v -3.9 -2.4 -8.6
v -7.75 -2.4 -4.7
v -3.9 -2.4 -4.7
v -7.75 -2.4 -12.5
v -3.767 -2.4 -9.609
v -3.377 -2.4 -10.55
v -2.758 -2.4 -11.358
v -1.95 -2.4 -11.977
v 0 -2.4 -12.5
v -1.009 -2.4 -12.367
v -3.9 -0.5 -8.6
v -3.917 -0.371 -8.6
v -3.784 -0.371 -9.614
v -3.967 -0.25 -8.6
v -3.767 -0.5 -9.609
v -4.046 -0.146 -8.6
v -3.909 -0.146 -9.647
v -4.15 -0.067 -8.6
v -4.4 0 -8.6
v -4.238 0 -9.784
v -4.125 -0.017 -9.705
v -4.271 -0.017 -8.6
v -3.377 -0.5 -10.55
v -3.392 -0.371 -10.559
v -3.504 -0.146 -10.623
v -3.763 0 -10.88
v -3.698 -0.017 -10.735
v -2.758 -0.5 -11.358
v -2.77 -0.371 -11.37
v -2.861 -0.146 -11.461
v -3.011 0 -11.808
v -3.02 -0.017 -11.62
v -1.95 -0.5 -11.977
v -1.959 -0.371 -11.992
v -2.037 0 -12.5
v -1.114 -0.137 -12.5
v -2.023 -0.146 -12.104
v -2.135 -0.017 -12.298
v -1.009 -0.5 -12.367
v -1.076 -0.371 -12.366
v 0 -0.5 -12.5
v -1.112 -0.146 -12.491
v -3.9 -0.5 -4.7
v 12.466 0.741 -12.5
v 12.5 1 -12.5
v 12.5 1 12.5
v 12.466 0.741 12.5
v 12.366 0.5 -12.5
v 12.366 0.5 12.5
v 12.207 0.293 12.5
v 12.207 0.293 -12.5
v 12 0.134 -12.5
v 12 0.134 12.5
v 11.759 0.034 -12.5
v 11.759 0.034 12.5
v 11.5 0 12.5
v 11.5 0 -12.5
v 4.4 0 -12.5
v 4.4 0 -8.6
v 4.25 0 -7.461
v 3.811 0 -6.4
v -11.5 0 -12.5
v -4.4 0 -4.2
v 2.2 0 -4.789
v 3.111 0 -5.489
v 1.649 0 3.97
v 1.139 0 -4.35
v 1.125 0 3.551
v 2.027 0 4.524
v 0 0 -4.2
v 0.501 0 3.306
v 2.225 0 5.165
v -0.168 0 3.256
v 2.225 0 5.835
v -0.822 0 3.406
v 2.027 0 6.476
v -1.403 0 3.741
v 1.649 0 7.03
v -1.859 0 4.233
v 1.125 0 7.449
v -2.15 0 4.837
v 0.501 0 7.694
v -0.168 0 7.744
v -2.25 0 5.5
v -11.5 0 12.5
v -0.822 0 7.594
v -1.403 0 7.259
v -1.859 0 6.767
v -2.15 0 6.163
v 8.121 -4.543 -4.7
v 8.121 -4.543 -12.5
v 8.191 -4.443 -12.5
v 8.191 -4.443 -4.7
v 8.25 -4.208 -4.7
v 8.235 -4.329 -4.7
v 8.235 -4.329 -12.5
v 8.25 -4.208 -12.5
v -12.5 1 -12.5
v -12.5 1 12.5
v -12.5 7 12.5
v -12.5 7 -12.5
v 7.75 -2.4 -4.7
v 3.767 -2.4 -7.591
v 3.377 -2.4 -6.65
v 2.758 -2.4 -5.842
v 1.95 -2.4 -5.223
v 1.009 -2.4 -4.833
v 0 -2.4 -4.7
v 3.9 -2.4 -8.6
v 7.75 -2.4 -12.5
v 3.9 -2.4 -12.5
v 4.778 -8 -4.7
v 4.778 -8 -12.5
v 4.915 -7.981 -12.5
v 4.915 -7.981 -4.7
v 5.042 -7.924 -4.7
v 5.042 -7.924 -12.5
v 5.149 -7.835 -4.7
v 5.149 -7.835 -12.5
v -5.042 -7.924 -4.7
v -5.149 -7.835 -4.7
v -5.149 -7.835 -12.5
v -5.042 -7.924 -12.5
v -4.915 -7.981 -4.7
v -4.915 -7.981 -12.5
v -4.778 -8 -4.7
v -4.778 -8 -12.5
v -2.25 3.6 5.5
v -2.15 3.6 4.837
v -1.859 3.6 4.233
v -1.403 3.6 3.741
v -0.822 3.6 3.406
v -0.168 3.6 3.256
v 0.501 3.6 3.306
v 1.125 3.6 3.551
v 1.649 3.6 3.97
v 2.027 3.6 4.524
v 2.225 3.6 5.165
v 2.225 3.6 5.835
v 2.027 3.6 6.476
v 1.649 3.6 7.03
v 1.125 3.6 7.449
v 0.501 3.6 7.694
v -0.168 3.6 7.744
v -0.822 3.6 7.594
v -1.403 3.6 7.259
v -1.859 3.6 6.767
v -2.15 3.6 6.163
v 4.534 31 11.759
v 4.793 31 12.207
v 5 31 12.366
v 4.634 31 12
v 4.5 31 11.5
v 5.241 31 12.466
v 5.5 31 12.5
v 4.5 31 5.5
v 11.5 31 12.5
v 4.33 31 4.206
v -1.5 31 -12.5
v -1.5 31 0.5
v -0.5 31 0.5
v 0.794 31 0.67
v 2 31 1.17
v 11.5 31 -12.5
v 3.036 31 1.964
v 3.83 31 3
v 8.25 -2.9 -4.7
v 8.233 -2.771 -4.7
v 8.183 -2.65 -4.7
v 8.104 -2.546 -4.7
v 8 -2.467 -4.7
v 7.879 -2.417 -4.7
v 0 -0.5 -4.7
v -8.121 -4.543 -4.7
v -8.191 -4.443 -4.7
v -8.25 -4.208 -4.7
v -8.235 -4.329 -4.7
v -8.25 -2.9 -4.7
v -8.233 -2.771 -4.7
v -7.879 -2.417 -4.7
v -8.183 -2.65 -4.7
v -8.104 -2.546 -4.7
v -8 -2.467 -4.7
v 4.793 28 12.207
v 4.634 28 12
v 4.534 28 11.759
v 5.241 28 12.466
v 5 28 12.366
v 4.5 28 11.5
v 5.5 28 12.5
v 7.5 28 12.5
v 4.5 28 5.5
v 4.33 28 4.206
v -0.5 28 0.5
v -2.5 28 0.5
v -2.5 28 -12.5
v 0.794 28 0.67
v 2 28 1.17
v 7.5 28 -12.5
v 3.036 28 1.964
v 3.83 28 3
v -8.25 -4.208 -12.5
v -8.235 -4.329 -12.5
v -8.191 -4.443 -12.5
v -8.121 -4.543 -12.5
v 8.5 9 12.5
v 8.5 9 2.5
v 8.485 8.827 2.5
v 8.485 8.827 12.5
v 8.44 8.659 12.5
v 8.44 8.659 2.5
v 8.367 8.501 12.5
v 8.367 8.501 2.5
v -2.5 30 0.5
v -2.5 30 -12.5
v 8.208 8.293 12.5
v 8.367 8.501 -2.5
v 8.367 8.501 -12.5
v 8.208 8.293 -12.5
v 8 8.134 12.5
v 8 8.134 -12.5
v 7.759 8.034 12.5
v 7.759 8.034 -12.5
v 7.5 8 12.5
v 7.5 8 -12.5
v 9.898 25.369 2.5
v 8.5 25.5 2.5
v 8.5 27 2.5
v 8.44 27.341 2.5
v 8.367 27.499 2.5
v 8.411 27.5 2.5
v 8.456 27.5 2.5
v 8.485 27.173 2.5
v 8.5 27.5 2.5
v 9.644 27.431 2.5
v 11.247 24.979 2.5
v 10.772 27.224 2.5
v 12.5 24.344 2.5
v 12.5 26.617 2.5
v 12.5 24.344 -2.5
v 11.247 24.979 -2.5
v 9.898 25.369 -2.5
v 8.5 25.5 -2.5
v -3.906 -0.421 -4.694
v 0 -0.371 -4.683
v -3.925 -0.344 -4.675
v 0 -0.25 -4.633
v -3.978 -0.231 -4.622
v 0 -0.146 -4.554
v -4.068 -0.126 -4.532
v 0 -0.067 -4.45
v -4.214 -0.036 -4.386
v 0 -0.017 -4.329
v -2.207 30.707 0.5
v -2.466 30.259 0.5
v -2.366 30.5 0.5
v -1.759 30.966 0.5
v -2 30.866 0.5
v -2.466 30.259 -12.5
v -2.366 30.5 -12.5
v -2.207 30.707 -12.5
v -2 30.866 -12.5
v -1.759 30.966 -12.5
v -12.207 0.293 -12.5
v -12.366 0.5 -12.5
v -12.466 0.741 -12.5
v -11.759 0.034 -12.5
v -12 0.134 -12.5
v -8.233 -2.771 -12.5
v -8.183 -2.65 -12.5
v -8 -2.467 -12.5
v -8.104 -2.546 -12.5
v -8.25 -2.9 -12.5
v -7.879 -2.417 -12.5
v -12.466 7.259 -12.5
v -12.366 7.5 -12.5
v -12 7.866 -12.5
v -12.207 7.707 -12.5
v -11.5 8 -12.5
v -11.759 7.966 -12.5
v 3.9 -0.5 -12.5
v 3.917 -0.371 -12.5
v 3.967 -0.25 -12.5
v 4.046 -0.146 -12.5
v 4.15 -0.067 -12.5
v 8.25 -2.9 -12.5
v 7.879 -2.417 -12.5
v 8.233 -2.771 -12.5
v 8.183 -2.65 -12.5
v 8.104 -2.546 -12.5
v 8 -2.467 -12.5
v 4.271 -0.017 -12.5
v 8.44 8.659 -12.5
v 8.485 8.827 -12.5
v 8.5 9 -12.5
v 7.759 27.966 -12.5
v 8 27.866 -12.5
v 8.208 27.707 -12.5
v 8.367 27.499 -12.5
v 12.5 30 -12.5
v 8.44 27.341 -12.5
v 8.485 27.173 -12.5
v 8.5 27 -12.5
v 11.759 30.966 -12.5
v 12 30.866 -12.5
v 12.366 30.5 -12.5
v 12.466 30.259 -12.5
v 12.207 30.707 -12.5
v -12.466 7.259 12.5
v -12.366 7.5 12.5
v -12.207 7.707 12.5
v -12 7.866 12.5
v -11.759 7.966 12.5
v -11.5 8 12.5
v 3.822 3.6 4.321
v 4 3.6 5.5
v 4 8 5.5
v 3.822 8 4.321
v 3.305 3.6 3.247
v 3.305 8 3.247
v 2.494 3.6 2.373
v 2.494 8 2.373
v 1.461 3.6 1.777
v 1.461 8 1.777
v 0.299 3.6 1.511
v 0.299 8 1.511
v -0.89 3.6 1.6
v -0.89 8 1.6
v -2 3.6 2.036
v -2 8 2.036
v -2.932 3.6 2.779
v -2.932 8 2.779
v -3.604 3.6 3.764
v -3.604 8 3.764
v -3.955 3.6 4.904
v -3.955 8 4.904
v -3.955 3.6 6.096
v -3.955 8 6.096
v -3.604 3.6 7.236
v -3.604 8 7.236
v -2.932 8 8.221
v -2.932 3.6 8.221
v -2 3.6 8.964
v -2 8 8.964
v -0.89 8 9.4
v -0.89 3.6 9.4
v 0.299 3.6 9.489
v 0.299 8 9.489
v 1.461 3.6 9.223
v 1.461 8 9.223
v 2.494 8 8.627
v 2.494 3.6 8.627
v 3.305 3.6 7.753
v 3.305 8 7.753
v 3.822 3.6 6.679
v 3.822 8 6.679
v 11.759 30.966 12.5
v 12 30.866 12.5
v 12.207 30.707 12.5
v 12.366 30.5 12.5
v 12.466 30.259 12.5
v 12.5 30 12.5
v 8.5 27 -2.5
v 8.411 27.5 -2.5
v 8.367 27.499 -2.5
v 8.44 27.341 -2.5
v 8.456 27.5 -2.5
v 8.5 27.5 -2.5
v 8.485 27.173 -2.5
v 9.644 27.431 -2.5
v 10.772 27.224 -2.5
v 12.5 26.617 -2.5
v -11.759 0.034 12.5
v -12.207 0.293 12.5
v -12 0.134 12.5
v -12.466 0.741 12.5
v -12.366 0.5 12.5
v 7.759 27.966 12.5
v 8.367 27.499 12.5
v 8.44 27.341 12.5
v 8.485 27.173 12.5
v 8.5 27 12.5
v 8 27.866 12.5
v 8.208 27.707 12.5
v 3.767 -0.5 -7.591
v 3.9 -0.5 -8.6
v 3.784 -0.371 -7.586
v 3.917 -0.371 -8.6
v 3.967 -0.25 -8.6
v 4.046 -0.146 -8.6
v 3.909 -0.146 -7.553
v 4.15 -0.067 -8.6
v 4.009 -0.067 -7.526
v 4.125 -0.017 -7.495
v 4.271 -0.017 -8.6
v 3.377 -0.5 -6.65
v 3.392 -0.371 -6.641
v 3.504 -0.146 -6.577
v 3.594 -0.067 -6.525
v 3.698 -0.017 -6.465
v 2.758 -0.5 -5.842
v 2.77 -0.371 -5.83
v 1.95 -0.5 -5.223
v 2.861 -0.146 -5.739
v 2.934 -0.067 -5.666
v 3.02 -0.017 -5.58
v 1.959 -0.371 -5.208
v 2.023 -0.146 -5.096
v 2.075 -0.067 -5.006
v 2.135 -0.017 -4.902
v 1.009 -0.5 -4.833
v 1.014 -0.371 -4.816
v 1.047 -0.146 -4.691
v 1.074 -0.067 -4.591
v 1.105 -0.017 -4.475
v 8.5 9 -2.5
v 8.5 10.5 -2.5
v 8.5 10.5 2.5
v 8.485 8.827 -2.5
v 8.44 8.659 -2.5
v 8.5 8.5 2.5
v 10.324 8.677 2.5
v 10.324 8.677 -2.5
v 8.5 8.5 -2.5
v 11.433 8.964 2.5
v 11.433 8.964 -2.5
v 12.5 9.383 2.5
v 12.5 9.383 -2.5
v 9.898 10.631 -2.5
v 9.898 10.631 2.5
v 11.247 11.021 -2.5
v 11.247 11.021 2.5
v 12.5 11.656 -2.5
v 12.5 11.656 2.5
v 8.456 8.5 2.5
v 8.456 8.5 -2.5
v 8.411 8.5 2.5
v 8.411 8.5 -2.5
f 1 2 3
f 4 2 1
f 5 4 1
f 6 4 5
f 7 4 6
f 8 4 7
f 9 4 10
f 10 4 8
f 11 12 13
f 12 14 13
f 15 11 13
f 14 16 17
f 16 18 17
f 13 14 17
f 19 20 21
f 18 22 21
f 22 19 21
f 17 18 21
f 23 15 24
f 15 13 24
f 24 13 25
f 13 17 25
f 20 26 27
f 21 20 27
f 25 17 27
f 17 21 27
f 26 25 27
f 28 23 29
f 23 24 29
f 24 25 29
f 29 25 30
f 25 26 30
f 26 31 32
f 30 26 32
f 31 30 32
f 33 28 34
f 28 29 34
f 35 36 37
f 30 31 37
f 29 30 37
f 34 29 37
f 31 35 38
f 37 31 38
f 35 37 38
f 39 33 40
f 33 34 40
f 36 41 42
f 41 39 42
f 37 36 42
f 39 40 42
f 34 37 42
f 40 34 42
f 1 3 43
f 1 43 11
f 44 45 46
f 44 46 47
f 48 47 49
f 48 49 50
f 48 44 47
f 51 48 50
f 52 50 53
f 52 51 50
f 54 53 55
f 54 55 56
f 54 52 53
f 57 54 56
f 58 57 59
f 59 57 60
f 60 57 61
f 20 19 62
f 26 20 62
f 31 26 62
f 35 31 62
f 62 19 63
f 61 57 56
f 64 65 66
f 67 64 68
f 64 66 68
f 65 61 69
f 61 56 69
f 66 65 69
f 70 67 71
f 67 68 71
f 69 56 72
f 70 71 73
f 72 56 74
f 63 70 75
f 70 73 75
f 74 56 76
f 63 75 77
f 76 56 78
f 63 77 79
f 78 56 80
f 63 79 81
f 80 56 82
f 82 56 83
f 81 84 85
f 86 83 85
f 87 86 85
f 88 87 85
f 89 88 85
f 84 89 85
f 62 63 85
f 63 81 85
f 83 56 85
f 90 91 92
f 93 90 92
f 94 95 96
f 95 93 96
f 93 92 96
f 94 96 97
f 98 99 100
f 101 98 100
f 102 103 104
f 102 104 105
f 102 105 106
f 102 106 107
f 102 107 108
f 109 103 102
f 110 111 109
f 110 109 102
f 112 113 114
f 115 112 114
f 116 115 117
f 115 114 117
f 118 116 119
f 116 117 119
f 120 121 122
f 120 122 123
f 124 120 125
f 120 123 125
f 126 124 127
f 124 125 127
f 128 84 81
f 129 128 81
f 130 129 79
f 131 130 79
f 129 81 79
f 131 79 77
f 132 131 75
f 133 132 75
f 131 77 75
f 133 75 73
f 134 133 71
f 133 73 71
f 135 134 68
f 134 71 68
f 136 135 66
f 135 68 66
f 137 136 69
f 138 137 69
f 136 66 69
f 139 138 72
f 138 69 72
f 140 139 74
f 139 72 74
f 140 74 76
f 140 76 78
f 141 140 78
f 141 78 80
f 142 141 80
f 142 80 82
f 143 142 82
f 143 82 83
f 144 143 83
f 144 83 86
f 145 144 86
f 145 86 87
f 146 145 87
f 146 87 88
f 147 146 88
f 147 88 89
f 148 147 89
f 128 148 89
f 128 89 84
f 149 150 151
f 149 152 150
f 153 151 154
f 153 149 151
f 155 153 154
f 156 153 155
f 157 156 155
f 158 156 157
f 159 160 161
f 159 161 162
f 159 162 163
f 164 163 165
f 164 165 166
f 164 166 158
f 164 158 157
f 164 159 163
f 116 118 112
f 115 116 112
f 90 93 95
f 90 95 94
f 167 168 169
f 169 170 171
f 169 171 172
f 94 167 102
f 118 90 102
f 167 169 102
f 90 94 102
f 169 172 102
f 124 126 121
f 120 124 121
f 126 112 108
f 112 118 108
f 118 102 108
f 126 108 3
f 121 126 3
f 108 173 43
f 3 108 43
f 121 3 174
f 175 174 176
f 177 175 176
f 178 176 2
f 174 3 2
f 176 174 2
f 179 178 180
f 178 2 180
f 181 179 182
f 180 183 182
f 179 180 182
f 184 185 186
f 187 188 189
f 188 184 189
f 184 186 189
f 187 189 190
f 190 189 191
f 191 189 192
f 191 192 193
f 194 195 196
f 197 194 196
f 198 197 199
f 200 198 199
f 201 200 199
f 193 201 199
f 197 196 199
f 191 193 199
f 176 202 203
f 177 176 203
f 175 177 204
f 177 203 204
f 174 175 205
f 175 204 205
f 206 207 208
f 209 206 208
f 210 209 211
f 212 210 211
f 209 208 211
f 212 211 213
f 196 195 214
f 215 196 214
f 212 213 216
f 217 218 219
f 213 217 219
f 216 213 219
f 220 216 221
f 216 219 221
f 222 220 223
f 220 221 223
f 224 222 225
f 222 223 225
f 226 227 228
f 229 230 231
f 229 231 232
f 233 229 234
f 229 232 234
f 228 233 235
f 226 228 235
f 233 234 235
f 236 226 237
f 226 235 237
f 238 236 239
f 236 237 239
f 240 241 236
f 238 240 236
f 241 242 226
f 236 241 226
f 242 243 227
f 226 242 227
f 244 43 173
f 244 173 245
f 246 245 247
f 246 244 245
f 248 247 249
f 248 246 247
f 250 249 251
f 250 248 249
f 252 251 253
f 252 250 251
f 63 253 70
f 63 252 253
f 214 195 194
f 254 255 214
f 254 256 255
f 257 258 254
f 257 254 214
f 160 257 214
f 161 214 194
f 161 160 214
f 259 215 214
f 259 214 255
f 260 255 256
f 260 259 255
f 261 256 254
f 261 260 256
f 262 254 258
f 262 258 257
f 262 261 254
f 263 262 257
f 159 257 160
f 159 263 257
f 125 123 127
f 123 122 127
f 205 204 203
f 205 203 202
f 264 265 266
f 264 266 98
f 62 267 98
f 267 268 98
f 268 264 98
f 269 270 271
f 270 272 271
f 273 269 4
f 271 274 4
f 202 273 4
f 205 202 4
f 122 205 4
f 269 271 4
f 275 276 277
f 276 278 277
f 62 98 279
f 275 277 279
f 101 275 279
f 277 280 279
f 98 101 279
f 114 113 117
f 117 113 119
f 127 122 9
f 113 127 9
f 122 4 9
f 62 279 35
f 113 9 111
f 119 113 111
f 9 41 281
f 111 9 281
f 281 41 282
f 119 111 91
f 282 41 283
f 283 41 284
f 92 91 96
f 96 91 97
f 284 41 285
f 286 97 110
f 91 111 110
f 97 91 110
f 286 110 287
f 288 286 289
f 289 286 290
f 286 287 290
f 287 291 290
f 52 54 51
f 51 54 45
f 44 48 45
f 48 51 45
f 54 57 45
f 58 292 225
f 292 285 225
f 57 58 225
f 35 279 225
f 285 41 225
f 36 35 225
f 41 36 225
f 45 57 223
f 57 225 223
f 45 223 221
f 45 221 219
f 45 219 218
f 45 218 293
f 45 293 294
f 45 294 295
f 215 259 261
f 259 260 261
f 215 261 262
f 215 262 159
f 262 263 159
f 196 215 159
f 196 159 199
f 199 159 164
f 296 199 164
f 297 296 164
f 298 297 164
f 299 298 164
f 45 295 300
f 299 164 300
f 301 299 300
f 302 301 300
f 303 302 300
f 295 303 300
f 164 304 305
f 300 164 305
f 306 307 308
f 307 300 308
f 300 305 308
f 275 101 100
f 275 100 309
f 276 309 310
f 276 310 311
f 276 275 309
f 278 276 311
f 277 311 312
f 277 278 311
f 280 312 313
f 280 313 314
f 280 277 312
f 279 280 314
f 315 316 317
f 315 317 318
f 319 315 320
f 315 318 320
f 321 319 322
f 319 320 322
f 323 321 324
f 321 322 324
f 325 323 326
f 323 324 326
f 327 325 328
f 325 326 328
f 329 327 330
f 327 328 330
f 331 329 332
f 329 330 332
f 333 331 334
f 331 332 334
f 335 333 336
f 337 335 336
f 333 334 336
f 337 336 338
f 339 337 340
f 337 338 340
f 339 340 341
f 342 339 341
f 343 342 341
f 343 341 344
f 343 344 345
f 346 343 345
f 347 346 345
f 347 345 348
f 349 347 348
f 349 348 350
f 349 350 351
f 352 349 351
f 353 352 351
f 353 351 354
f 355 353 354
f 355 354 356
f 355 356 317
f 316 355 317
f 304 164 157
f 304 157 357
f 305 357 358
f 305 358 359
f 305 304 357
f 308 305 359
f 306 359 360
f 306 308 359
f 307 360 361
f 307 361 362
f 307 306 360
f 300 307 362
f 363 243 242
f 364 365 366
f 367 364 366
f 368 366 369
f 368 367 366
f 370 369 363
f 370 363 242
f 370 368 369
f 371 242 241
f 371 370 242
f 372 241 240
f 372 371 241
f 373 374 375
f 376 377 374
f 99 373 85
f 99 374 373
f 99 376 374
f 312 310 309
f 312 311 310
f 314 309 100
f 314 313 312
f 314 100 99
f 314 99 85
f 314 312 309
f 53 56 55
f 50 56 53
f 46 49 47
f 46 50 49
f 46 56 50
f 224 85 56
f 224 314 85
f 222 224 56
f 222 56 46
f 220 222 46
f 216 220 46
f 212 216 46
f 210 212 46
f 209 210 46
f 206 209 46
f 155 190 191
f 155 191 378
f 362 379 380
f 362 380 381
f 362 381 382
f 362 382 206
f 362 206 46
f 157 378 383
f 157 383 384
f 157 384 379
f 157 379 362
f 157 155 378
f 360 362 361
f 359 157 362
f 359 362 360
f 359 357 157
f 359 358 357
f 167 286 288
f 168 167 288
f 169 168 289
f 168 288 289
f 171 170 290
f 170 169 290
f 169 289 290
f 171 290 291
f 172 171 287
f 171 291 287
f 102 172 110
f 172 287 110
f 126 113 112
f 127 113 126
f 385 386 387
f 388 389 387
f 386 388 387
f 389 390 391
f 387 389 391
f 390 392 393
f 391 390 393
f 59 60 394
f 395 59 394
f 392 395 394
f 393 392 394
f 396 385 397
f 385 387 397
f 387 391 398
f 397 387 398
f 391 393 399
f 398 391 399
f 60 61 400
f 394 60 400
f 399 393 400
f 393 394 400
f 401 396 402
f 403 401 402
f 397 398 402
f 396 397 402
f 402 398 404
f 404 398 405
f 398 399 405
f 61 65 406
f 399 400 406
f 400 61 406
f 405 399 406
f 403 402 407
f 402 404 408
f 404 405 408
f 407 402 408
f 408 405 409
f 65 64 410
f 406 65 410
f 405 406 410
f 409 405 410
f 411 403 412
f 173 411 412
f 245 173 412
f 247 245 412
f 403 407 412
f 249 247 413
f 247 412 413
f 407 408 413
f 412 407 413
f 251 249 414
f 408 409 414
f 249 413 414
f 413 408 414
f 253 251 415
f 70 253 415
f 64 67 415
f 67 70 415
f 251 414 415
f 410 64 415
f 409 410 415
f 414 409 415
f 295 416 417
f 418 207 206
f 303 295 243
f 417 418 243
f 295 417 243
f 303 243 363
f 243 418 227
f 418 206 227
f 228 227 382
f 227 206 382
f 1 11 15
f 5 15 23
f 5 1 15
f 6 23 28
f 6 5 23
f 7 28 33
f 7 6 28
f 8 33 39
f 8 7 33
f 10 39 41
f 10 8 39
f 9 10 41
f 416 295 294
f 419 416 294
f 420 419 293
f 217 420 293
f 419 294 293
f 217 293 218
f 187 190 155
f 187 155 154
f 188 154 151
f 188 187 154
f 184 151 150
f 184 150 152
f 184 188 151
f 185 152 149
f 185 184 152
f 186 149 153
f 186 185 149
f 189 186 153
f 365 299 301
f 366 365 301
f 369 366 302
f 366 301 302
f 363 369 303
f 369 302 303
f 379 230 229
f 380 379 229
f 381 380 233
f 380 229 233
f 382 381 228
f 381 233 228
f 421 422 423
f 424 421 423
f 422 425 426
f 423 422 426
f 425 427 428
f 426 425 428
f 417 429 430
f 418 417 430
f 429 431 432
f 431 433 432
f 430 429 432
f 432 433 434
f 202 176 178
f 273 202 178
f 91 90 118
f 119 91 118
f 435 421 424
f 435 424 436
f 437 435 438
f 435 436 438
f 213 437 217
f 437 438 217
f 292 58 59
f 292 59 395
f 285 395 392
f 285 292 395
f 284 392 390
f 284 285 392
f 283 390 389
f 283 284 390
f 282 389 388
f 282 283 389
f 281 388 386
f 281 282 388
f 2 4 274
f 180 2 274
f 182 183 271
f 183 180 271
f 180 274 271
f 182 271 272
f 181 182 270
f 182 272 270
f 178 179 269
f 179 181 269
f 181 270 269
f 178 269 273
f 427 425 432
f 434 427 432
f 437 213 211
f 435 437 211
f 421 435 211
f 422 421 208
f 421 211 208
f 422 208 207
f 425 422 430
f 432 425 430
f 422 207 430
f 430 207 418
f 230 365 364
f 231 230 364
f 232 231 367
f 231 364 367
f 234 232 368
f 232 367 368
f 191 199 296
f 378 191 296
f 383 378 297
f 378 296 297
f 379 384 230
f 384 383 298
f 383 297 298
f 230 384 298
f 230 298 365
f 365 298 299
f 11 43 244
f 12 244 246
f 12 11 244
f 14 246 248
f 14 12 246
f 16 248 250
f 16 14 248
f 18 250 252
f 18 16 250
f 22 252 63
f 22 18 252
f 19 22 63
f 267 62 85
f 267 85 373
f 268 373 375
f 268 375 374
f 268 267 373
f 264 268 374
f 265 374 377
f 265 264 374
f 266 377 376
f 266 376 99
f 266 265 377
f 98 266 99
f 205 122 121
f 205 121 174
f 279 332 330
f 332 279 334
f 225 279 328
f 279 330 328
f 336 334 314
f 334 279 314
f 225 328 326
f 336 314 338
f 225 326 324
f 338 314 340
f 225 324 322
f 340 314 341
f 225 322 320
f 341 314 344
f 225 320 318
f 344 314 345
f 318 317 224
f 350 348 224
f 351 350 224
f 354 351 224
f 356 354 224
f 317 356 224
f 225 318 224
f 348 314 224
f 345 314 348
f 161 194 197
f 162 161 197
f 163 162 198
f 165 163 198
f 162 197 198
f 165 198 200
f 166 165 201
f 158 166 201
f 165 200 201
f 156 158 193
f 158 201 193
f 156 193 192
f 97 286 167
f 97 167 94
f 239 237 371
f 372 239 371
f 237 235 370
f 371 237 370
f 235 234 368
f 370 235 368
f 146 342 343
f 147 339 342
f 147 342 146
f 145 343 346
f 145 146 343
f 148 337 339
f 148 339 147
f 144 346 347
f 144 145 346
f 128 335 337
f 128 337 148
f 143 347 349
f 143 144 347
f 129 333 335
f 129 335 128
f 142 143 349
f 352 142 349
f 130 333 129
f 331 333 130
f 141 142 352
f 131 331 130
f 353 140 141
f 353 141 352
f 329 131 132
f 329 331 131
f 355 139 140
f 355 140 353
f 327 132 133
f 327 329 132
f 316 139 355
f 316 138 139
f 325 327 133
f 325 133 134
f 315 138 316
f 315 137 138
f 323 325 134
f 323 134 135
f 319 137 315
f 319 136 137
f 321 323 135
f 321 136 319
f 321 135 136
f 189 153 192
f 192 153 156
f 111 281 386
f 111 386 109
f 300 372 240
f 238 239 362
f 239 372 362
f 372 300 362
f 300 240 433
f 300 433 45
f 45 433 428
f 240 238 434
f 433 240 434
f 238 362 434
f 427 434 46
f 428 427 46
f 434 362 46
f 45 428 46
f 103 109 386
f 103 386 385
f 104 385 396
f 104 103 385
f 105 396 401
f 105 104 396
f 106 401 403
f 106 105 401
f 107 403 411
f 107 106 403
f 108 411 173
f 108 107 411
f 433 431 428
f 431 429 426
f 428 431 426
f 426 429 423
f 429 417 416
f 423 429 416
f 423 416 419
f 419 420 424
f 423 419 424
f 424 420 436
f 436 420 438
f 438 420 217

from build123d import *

# Parameters (mm, degrees)
BOSS_EXTRUDE1_DEPTH                                 = 12.5
CBORE_FOR_M4_HEX_SOCKET_HEAD_CAP_SCREW1_D           = 4.5
CBORE_FOR_M4_HEX_SOCKET_HEAD_CAP_SCREW1_DEPTH       = 8
CBORE_FOR_M4_HEX_SOCKET_HEAD_CAP_SCREW1_CBORE_D     = 8
CBORE_FOR_M4_HEX_SOCKET_HEAD_CAP_SCREW1_CBORE_DEPTH = 4.4
BOSS_EXTRUDE3_DEPTH                                 = 7.8
CUT_EXTRUDE3_REACH                                  = 44.819
SKETCH15_W                                          = 6.999999999999991
SKETCH15_H                                          = 12.000000000000002
CUT_EXTRUDE1_DEPTH                                  = 2.4
FILLET3_R                                           = 0.5
SKETCH13_W                                          = 1.9999999999999998
SKETCH13_H                                          = 5
FILLET4_START                                       = 28
FILLET4_DEPTH                                       = 3
FILLET4_START_2                                     = -12.5
FILLET4_2_DEPTH                                     = 25
FILLET4_3_DEPTH                                     = 10
FILLET4_START_3                                     = 2.5
FILLET4_4_DEPTH                                     = 10
FILLET4_START_4                                     = 27
FILLET4_5_DEPTH                                     = 5
FILLET4_START_5                                     = -13
FILLET4_6_DEPTH                                     = 26


with BuildPart() as part:
    # Sketch1 → Boss-Extrude1 (new, symmetric)
    with BuildSketch(Plane.XY):
        Polygon((-12.5, 7.999999999999993), (8.500000000000004, 7.9999999999999885), (8.500000000000004, 27.999999999999982), (-2.4999999999999987, 27.999999999999975), (-2.4999999999999987, 30.99999999999999), (12.5, 31), (12.5, -2.94e-15), (-12.5, -1.41e-15), align=None)
    extrude(amount=BOSS_EXTRUDE1_DEPTH, both=True)

    # CBORE for M4 Hex Socket Head Cap Screw1
    with Locations(Plane(origin=(1.98e-15, 7.999999999999989, 0), x_dir=(1, -1.1e-16, 0), z_dir=(1.1e-16, 1, 0))):
        with Locations((0, -5.5)):
            CounterBoreHole(CBORE_FOR_M4_HEX_SOCKET_HEAD_CAP_SCREW1_D / 2, CBORE_FOR_M4_HEX_SOCKET_HEAD_CAP_SCREW1_CBORE_D / 2, CBORE_FOR_M4_HEX_SOCKET_HEAD_CAP_SCREW1_CBORE_DEPTH, depth=CBORE_FOR_M4_HEX_SOCKET_HEAD_CAP_SCREW1_DEPTH)

    # Sketch5 → Boss-Extrude3 (add)
    with BuildSketch(Plane(origin=(0, 0, -12.5), x_dir=(-1, 0, 0), z_dir=(0, 0, -1))):
        Polygon((-4.999999999999999, -8), (5.000000000000001, -7.999999999999998), (8.249999999999996, -4.400000000000003), (8.25, -2.400000000000003), (3.9000000000000012, -2.400000000000003), (3.9, -3.06e-15), (-3.9, -4.02e-15), (-3.9000000000000004, -2.400000000000004), (-8.25, -2.400000000000005), (-8.249999999999996, -4.400000000000005), align=None)
    extrude(amount=-BOSS_EXTRUDE3_DEPTH)

    # Sketch15 → Cut-Extrude3 (cut, up to next)
    with BuildSketch(Plane(origin=(-2.151e-14, 30.999999999999993, 0), x_dir=(1, 6.9e-16, 0), z_dir=(-6.9e-16, 1, 0)), mode=Mode.PRIVATE) as cut_extrude3_sk1:
        with Locations((1.0000000000000187, -6.500000000000001)):
            Rectangle(SKETCH15_W, SKETCH15_H)
    cut_extrude3_tool1 = extrude(cut_extrude3_sk1.sketch, amount=-CUT_EXTRUDE3_REACH, mode=Mode.PRIVATE) & part.part
    add(cut_extrude3_tool1.solids().sort_by_distance((1, 31, 6.5))[0], mode=Mode.SUBTRACT)

    # Sketch6 → Cut-Extrude1 (cut)
    with BuildSketch(Plane(origin=(0, -2.400000000000003, 0), x_dir=(1, 0, 0), z_dir=(0, 1, 0))):
        with BuildLine():
            ThreePointArc((-3.900000000000001, 8.600000000000001), (-2.7577164466274824, 11.357716446627592), (1.491e-13, 12.500000000000004))
            Line((1.4921e-13, 12.5), (-3.9, 12.5))
            Line((-3.9, 12.5), (-3.9, 8.600000000000005))
        make_face()
        with BuildLine():
            Line((3.9, 4.700000000000001), (3.9000000000000004, 8.600000000000001))
            ThreePointArc((3.9000000000000026, 8.6), (2.7577164513941343, 5.842283558139062), (1.348197454e-08, 4.699999999999999))
            Line((1.348197465e-08, 4.700000000000001), (3.9, 4.700000000000001))
        make_face()
    extrude(amount=CUT_EXTRUDE1_DEPTH, mode=Mode.SUBTRACT)

    # Fillet3
    # the kernel refuses this fillet: 0.5 mm, written as the material it adds along each edge
    with BuildSketch(Plane(origin=(-3.9, -3.06e-15, -4.7), x_dir=(0, 2.38e-15, 1), z_dir=(1, -1.2e-16, 0))) as fillet3_piece_1:
        with BuildLine():
            CenterArc((FILLET3_R, FILLET3_R), FILLET3_R, 180, 90.00000000000011)
            Line((-1.19e-15, FILLET3_R), (0, 0))
            Line((0, 0), (FILLET3_R, 0))
        make_face()
    extrude(amount=3.9000000134819746)
    with BuildSketch(Plane(origin=(-3.9, -3.06e-15, -8.600000000000003), x_dir=(-1, 2.35e-15, 0), z_dir=(0, 0, 1))) as fillet3_piece_2:
        with BuildLine():
            CenterArc((FILLET3_R, FILLET3_R), FILLET3_R, 179.99999999999997, 90.00000000000017)
            Line((-2.51e-15, FILLET3_R), (0, 0))
            Line((0, 0), (FILLET3_R, 0))
        make_face()
    extrude(amount=3.900000000000003)
    with BuildSketch(Plane(origin=(3.9, -4.02e-15, -12.5), x_dir=(1, 3.15e-15, 0), z_dir=(0, 0, 1))) as fillet3_piece_3:
        with BuildLine():
            CenterArc((FILLET3_R, -FILLET3_R), FILLET3_R, 89.99999999999982, 90.00000000000017)
            Line((-1.13e-15, -FILLET3_R), (0, 0))
            Line((0, 0), (FILLET3_R, 0))
        make_face()
    extrude(amount=3.8999999999999986)
    with BuildSketch(Plane(origin=(-1.78e-15, -3.11e-15, -8.600000000000005), x_dir=(1, 0, 1.37e-15), z_dir=(1.37e-15, 0, -1))) as fillet3_piece_4:
        with BuildLine():
            CenterArc((3.9000000000000057 + FILLET3_R, FILLET3_R), FILLET3_R, 179.99999999999991, 90.00000000000011)
            Line((3.9000000000000057, FILLET3_R), (3.9000000000000057, 0))
            Line((3.9000000000000057, 0), (3.9000000000000057 + FILLET3_R, -7.8e-16))
        make_face()
    revolve(axis=Axis((-1.78e-15, -3.11e-15, -8.600000000000005), (0, -1, 0)), revolution_arc=89.99999980193317)
    with BuildSketch(Plane(origin=(-4.4e-16, -3.11e-15, -8.600000000000005), x_dir=(-1, 0, 9.1e-16), z_dir=(9.1e-16, 0, 1))) as fillet3_piece_5_section:
        with BuildLine():
            CenterArc((3.9 + FILLET3_R, FILLET3_R), FILLET3_R, 179.99999999999986, 90.00000000000011)
            Line((3.9, FILLET3_R), (3.9, 0))
            Line((3.9, 0), (3.9 + FILLET3_R, -1.11e-15))
        make_face()
    fillet3_piece_5 = revolve(axis=Axis((-4.4e-16, -3.11e-15, -8.600000000000005), (0, -1, 0)), revolution_arc=121.23139509020365, mode=Mode.PRIVATE)
    fillet3_piece_5 = split(fillet3_piece_5, bisect_by=Plane(origin=(-4.4e-16, -3.11e-15, -12.5), z_dir=(0, 0, 1)), keep=Keep.TOP, mode=Mode.PRIVATE)
    add(fillet3_piece_5)
    with BuildSketch(Plane(origin=(-5.15, -2.91e-15, -4.7), x_dir=(0, 2.38e-15, 1), z_dir=(1, -1.2e-16, 0))) as fillet3_piece_6a_section:
        with BuildLine():
            CenterArc((FILLET3_R, FILLET3_R), FILLET3_R, 180, 90.00000000000011)
            Line((-1.19e-15, FILLET3_R), (0, 0))
            Line((0, 0), (FILLET3_R, 0))
        make_face()
    fillet3_piece_6a = extrude(amount=5.150000013481975, mode=Mode.PRIVATE)
    fillet3_piece_6a = split(fillet3_piece_6a, bisect_by=Plane(origin=(-3.9, -3.6e-15, -4.7), z_dir=(-1, 5.6e-16, 0)), keep=Keep.TOP, mode=Mode.PRIVATE)
    with BuildSketch(Plane(origin=(-3.9, -3.06e-15, -8.600000000000003), x_dir=(-1, 2.35e-15, 0), z_dir=(0, 0, 1))) as fillet3_piece_6b_section:
        with BuildLine():
            CenterArc((FILLET3_R, FILLET3_R), FILLET3_R, 179.99999999999997, 90.00000000000017)
            Line((-2.51e-15, FILLET3_R), (0, 0))
            Line((0, 0), (FILLET3_R, 0))
        make_face()
    fillet3_piece_6b = extrude(amount=5.150000000000004, mode=Mode.PRIVATE)
    fillet3_piece_6b = split(fillet3_piece_6b, bisect_by=Plane(origin=(-3.9, -3.06e-15, -4.7), z_dir=(0, 0, 1)), keep=Keep.TOP, mode=Mode.PRIVATE)
    fillet3_piece_6 = fillet3_piece_6a & fillet3_piece_6b
    add(fillet3_piece_6)
    # the kernel refuses this fillet: 0.5 mm, written as the material it takes off along each edge
    with BuildSketch(Plane(origin=(-8.249999999999996, -4.400000000000003, -12.98076923076923), x_dir=(0.6701030927835051, -0.7422680412371134, 0), z_dir=(0, 0, 1))) as fillet3_2_piece_1:
        with BuildLine():
            CenterArc((FILLET3_R * 0.384615384615, FILLET3_R), FILLET3_R, 227.92497794915644, 42.07502205084347)
            Line((-FILLET3_R * 0.285487708168, FILLET3_R * 0.257731958763), (0, 0))
            Line((0, 0), (FILLET3_R * 0.384615384615, 1e-17))
        make_face()
    extrude(amount=8.761538461538459, mode=Mode.SUBTRACT)
    with BuildSketch(Plane(origin=(-5.000000000000001, -7.999999999999998, -13.055555555555557), x_dir=(1, 0, 0), z_dir=(0, 0, 1))) as fillet3_2_piece_2:
        with BuildLine():
            CenterArc((FILLET3_R * 0.444444444444, FILLET3_R), FILLET3_R, 222.07502205084361, 47.924977949156414)
            Line((-FILLET3_R * 0.297823596793, FILLET3_R * 0.329896907216), (0, 0))
            Line((0, 0), (FILLET3_R * 0.444444444444, 0))
        make_face()
    extrude(amount=8.911111111111113, mode=Mode.SUBTRACT)
    with BuildSketch(Plane(origin=(4.999999999999999, -8, -13.055555555555555), x_dir=(0.6701030927835051, 0.7422680412371134, 0), z_dir=(0, 0, 1))) as fillet3_2_piece_3:
        with BuildLine():
            CenterArc((FILLET3_R * 0.444444444444, FILLET3_R), FILLET3_R, 222.07502205084361, 47.9249779491563)
            Line((-FILLET3_R * 0.297823596793, FILLET3_R * 0.329896907216), (0, 0))
            Line((0, 0), (FILLET3_R * 0.444444444444, -1e-17))
        make_face()
    extrude(amount=8.911111111111111, mode=Mode.SUBTRACT)
    with BuildSketch(Plane(origin=(8.249999999999996, -4.400000000000005, -12.98076923076923), x_dir=(-0.6701030927835051, -0.7422680412371134, 0), z_dir=(0, 0, 1))) as fillet3_2_piece_4:
        with BuildLine():
            CenterArc((FILLET3_R * 0.384615384615, -FILLET3_R), FILLET3_R, 89.99999999999999, 42.07502205084343)
            Line((-FILLET3_R * 0.285487708168, -FILLET3_R * 0.257731958763), (0, 0))
            Line((0, 0), (FILLET3_R * 0.384615384615, -1e-17))
        make_face()
    extrude(amount=8.761538461538459, mode=Mode.SUBTRACT)
    with BuildSketch(Plane(origin=(8.25, -2.400000000000005, -13.750000000000002), x_dir=(-1, 0, 0), z_dir=(0, 0, 1))) as fillet3_2_piece_5:
        with BuildLine():
            CenterArc((FILLET3_R, FILLET3_R), FILLET3_R, 179.9999999999999, 90.00000000000011)
            Line((0, FILLET3_R), (0, 0))
            Line((0, 0), (FILLET3_R, 0))
        make_face()
    extrude(amount=10.300000000000004, mode=Mode.SUBTRACT)
    with BuildSketch(Plane(origin=(-8.25, -2.400000000000003, -13.750000000000002), x_dir=(3.55e-15, -1, 0), z_dir=(0, 0, 1))) as fillet3_2_piece_6:
        with BuildLine():
            CenterArc((FILLET3_R, FILLET3_R), FILLET3_R, 180, 89.99999999999989)
            Line((1.33e-15, FILLET3_R), (0, 0))
            Line((0, 0), (FILLET3_R, 0))
        make_face()
    extrude(amount=10.300000000000002, mode=Mode.SUBTRACT)

    # Cut-Sweep1: sweep along a path in Sketch7
    with BuildLine(Plane.XY) as cut_sweep1_path:
        EllipticalCenterArc((8.500000000000004, 17.99999999999999), 7.5, 7.5, start_angle=0, arc_size=360, rotation=-89.99999999999999)
    # Sketch13 → Cut-Sweep1 (sweep, cut)
    with BuildSketch(Plane(origin=(1.0000000000000044, 17.99999999999999, 0), x_dir=(-1, 3.3e-16, 0), z_dir=(-3.3e-16, -1, 0))):
        with Locations((0.9999999999999983, 0)):
            Rectangle(SKETCH13_W, SKETCH13_H)
    sweep(path=cut_sweep1_path.line, mode=Mode.SUBTRACT)

    # Fillet4: read off the stored shape, not the designer's step
    # Fillet4 outline → Fillet4 (add)
    with BuildSketch(Plane(origin=(0, 0, 0), x_dir=(1, 0, 0), z_dir=(0, 1, 0)).offset(FILLET4_START)):
        with BuildLine():
            Line((4.5, -0.5), (-0.5, -0.5))
            ThreePointArc((-0.5, -0.5), (3.035533906, -1.964466094), (4.5, -5.5))
            Line((4.5, -5.5), (4.5, -0.5))
        make_face()
    extrude(amount=FILLET4_DEPTH)

    # Fillet4 2 outline → Fillet4 2 (add)
    with BuildSketch(Plane.XY.offset(FILLET4_START_2)):
        with BuildLine():
            Line((8.5, 28), (7.5, 28))
            ThreePointArc((7.5, 28), (8.000468348, 27.865754834), (8.366565783, 27.499062865))
            ThreePointArc((8.366565783, 27.499062865), (8.433281246, 27.499765713), (8.5, 27.5))
            Line((8.5, 27.5), (8.5, 28))
        make_face()
        with BuildLine():
            ThreePointArc((8.5, 8.5), (8.433281246, 8.500234287), (8.366565783, 8.500937135))
            ThreePointArc((8.366565783, 8.500937135), (8.000468348, 8.134245166), (7.5, 8))
            Line((7.5, 8), (8.5, 8))
            Line((8.5, 8), (8.5, 8.5))
        make_face()
    extrude(amount=FILLET4_2_DEPTH)

    # Fillet4 3 outline → Fillet4 3 (add)
    with BuildSketch(Plane.XY.offset(FILLET4_START_2)):
        with BuildLine():
            ThreePointArc((8.5, 27.5), (8.433281246, 27.499765713), (8.366565783, 27.499062865))
            ThreePointArc((8.366565783, 27.499062865), (8.466065677, 27.258296551), (8.5, 27))
            Line((8.5, 27), (8.5, 27.5))
        make_face()
        with BuildLine():
            Line((8.5, 8.5), (8.5, 9))
            ThreePointArc((8.5, 9), (8.466065677, 8.741703449), (8.366565783, 8.500937135))
            ThreePointArc((8.366565783, 8.500937135), (8.433281246, 8.500234287), (8.5, 8.5))
        make_face()
    extrude(amount=FILLET4_3_DEPTH)

    # Fillet4 4 outline → Fillet4 4 (add)
    with BuildSketch(Plane.XY.offset(FILLET4_START_3)):
        with BuildLine():
            ThreePointArc((8.5, 27.5), (8.433281246, 27.499765713), (8.366565783, 27.499062865))
            ThreePointArc((8.366565783, 27.499062865), (8.466065677, 27.258296551), (8.5, 27))
            Line((8.5, 27), (8.5, 27.5))
        make_face()
        with BuildLine():
            Line((8.5, 8.5), (8.5, 9))
            ThreePointArc((8.5, 9), (8.466065677, 8.741703449), (8.366565783, 8.500937135))
            ThreePointArc((8.366565783, 8.500937135), (8.433281246, 8.500234287), (8.5, 8.5))
        make_face()
    extrude(amount=FILLET4_4_DEPTH)

    # Fillet4 5 outline → Fillet4 5 (cut)
    with BuildSketch(Plane(origin=(0, 0, 0), x_dir=(1, 0, 0), z_dir=(0, 1, 0)).offset(FILLET4_START_4)):
        with BuildLine():
            ThreePointArc((5.5, -12.5), (4.792893219, -12.207106781), (4.5, -11.5))
            Line((4.5, -11.5), (4.5, -12.5))
            Line((4.5, -12.5), (5.5, -12.5))
        make_face()
    extrude(amount=FILLET4_5_DEPTH, mode=Mode.SUBTRACT)

    # Fillet4 6 outline → Fillet4 6 (cut)
    with BuildSketch(Plane.XY.offset(FILLET4_START_5)):
        with BuildLine():
            Line((-2.5, 31), (-2.5, 30))
            ThreePointArc((-2.5, 30), (-2.207106781, 30.707106781), (-1.5, 31))
            Line((-1.5, 31), (-2.5, 31))
        make_face()
        with BuildLine():
            Line((12.5, 31), (11.5, 31))
            ThreePointArc((11.5, 31), (12.207106781, 30.707106781), (12.5, 30))
            Line((12.5, 30), (12.5, 31))
        make_face()
        with BuildLine():
            Line((12.5, 0), (12.5, 1))
            ThreePointArc((12.5, 1), (12.207106781, 0.292893219), (11.5, 0))
            Line((11.5, 0), (12.5, 0))
        make_face()
        with BuildLine():
            ThreePointArc((-12.5, 7), (-12.207106781, 7.707106781), (-11.5, 8))
            Line((-11.5, 8), (-12.5, 8))
            Line((-12.5, 8), (-12.5, 7))
        make_face()
        with BuildLine():
            Line((-12.5, 0), (-11.5, 0))
            ThreePointArc((-11.5, 0), (-12.207106781, 0.292893219), (-12.5, 1))
            Line((-12.5, 1), (-12.5, 0))
        make_face()
    extrude(amount=FILLET4_6_DEPTH, mode=Mode.SUBTRACT)


solid = part.part
